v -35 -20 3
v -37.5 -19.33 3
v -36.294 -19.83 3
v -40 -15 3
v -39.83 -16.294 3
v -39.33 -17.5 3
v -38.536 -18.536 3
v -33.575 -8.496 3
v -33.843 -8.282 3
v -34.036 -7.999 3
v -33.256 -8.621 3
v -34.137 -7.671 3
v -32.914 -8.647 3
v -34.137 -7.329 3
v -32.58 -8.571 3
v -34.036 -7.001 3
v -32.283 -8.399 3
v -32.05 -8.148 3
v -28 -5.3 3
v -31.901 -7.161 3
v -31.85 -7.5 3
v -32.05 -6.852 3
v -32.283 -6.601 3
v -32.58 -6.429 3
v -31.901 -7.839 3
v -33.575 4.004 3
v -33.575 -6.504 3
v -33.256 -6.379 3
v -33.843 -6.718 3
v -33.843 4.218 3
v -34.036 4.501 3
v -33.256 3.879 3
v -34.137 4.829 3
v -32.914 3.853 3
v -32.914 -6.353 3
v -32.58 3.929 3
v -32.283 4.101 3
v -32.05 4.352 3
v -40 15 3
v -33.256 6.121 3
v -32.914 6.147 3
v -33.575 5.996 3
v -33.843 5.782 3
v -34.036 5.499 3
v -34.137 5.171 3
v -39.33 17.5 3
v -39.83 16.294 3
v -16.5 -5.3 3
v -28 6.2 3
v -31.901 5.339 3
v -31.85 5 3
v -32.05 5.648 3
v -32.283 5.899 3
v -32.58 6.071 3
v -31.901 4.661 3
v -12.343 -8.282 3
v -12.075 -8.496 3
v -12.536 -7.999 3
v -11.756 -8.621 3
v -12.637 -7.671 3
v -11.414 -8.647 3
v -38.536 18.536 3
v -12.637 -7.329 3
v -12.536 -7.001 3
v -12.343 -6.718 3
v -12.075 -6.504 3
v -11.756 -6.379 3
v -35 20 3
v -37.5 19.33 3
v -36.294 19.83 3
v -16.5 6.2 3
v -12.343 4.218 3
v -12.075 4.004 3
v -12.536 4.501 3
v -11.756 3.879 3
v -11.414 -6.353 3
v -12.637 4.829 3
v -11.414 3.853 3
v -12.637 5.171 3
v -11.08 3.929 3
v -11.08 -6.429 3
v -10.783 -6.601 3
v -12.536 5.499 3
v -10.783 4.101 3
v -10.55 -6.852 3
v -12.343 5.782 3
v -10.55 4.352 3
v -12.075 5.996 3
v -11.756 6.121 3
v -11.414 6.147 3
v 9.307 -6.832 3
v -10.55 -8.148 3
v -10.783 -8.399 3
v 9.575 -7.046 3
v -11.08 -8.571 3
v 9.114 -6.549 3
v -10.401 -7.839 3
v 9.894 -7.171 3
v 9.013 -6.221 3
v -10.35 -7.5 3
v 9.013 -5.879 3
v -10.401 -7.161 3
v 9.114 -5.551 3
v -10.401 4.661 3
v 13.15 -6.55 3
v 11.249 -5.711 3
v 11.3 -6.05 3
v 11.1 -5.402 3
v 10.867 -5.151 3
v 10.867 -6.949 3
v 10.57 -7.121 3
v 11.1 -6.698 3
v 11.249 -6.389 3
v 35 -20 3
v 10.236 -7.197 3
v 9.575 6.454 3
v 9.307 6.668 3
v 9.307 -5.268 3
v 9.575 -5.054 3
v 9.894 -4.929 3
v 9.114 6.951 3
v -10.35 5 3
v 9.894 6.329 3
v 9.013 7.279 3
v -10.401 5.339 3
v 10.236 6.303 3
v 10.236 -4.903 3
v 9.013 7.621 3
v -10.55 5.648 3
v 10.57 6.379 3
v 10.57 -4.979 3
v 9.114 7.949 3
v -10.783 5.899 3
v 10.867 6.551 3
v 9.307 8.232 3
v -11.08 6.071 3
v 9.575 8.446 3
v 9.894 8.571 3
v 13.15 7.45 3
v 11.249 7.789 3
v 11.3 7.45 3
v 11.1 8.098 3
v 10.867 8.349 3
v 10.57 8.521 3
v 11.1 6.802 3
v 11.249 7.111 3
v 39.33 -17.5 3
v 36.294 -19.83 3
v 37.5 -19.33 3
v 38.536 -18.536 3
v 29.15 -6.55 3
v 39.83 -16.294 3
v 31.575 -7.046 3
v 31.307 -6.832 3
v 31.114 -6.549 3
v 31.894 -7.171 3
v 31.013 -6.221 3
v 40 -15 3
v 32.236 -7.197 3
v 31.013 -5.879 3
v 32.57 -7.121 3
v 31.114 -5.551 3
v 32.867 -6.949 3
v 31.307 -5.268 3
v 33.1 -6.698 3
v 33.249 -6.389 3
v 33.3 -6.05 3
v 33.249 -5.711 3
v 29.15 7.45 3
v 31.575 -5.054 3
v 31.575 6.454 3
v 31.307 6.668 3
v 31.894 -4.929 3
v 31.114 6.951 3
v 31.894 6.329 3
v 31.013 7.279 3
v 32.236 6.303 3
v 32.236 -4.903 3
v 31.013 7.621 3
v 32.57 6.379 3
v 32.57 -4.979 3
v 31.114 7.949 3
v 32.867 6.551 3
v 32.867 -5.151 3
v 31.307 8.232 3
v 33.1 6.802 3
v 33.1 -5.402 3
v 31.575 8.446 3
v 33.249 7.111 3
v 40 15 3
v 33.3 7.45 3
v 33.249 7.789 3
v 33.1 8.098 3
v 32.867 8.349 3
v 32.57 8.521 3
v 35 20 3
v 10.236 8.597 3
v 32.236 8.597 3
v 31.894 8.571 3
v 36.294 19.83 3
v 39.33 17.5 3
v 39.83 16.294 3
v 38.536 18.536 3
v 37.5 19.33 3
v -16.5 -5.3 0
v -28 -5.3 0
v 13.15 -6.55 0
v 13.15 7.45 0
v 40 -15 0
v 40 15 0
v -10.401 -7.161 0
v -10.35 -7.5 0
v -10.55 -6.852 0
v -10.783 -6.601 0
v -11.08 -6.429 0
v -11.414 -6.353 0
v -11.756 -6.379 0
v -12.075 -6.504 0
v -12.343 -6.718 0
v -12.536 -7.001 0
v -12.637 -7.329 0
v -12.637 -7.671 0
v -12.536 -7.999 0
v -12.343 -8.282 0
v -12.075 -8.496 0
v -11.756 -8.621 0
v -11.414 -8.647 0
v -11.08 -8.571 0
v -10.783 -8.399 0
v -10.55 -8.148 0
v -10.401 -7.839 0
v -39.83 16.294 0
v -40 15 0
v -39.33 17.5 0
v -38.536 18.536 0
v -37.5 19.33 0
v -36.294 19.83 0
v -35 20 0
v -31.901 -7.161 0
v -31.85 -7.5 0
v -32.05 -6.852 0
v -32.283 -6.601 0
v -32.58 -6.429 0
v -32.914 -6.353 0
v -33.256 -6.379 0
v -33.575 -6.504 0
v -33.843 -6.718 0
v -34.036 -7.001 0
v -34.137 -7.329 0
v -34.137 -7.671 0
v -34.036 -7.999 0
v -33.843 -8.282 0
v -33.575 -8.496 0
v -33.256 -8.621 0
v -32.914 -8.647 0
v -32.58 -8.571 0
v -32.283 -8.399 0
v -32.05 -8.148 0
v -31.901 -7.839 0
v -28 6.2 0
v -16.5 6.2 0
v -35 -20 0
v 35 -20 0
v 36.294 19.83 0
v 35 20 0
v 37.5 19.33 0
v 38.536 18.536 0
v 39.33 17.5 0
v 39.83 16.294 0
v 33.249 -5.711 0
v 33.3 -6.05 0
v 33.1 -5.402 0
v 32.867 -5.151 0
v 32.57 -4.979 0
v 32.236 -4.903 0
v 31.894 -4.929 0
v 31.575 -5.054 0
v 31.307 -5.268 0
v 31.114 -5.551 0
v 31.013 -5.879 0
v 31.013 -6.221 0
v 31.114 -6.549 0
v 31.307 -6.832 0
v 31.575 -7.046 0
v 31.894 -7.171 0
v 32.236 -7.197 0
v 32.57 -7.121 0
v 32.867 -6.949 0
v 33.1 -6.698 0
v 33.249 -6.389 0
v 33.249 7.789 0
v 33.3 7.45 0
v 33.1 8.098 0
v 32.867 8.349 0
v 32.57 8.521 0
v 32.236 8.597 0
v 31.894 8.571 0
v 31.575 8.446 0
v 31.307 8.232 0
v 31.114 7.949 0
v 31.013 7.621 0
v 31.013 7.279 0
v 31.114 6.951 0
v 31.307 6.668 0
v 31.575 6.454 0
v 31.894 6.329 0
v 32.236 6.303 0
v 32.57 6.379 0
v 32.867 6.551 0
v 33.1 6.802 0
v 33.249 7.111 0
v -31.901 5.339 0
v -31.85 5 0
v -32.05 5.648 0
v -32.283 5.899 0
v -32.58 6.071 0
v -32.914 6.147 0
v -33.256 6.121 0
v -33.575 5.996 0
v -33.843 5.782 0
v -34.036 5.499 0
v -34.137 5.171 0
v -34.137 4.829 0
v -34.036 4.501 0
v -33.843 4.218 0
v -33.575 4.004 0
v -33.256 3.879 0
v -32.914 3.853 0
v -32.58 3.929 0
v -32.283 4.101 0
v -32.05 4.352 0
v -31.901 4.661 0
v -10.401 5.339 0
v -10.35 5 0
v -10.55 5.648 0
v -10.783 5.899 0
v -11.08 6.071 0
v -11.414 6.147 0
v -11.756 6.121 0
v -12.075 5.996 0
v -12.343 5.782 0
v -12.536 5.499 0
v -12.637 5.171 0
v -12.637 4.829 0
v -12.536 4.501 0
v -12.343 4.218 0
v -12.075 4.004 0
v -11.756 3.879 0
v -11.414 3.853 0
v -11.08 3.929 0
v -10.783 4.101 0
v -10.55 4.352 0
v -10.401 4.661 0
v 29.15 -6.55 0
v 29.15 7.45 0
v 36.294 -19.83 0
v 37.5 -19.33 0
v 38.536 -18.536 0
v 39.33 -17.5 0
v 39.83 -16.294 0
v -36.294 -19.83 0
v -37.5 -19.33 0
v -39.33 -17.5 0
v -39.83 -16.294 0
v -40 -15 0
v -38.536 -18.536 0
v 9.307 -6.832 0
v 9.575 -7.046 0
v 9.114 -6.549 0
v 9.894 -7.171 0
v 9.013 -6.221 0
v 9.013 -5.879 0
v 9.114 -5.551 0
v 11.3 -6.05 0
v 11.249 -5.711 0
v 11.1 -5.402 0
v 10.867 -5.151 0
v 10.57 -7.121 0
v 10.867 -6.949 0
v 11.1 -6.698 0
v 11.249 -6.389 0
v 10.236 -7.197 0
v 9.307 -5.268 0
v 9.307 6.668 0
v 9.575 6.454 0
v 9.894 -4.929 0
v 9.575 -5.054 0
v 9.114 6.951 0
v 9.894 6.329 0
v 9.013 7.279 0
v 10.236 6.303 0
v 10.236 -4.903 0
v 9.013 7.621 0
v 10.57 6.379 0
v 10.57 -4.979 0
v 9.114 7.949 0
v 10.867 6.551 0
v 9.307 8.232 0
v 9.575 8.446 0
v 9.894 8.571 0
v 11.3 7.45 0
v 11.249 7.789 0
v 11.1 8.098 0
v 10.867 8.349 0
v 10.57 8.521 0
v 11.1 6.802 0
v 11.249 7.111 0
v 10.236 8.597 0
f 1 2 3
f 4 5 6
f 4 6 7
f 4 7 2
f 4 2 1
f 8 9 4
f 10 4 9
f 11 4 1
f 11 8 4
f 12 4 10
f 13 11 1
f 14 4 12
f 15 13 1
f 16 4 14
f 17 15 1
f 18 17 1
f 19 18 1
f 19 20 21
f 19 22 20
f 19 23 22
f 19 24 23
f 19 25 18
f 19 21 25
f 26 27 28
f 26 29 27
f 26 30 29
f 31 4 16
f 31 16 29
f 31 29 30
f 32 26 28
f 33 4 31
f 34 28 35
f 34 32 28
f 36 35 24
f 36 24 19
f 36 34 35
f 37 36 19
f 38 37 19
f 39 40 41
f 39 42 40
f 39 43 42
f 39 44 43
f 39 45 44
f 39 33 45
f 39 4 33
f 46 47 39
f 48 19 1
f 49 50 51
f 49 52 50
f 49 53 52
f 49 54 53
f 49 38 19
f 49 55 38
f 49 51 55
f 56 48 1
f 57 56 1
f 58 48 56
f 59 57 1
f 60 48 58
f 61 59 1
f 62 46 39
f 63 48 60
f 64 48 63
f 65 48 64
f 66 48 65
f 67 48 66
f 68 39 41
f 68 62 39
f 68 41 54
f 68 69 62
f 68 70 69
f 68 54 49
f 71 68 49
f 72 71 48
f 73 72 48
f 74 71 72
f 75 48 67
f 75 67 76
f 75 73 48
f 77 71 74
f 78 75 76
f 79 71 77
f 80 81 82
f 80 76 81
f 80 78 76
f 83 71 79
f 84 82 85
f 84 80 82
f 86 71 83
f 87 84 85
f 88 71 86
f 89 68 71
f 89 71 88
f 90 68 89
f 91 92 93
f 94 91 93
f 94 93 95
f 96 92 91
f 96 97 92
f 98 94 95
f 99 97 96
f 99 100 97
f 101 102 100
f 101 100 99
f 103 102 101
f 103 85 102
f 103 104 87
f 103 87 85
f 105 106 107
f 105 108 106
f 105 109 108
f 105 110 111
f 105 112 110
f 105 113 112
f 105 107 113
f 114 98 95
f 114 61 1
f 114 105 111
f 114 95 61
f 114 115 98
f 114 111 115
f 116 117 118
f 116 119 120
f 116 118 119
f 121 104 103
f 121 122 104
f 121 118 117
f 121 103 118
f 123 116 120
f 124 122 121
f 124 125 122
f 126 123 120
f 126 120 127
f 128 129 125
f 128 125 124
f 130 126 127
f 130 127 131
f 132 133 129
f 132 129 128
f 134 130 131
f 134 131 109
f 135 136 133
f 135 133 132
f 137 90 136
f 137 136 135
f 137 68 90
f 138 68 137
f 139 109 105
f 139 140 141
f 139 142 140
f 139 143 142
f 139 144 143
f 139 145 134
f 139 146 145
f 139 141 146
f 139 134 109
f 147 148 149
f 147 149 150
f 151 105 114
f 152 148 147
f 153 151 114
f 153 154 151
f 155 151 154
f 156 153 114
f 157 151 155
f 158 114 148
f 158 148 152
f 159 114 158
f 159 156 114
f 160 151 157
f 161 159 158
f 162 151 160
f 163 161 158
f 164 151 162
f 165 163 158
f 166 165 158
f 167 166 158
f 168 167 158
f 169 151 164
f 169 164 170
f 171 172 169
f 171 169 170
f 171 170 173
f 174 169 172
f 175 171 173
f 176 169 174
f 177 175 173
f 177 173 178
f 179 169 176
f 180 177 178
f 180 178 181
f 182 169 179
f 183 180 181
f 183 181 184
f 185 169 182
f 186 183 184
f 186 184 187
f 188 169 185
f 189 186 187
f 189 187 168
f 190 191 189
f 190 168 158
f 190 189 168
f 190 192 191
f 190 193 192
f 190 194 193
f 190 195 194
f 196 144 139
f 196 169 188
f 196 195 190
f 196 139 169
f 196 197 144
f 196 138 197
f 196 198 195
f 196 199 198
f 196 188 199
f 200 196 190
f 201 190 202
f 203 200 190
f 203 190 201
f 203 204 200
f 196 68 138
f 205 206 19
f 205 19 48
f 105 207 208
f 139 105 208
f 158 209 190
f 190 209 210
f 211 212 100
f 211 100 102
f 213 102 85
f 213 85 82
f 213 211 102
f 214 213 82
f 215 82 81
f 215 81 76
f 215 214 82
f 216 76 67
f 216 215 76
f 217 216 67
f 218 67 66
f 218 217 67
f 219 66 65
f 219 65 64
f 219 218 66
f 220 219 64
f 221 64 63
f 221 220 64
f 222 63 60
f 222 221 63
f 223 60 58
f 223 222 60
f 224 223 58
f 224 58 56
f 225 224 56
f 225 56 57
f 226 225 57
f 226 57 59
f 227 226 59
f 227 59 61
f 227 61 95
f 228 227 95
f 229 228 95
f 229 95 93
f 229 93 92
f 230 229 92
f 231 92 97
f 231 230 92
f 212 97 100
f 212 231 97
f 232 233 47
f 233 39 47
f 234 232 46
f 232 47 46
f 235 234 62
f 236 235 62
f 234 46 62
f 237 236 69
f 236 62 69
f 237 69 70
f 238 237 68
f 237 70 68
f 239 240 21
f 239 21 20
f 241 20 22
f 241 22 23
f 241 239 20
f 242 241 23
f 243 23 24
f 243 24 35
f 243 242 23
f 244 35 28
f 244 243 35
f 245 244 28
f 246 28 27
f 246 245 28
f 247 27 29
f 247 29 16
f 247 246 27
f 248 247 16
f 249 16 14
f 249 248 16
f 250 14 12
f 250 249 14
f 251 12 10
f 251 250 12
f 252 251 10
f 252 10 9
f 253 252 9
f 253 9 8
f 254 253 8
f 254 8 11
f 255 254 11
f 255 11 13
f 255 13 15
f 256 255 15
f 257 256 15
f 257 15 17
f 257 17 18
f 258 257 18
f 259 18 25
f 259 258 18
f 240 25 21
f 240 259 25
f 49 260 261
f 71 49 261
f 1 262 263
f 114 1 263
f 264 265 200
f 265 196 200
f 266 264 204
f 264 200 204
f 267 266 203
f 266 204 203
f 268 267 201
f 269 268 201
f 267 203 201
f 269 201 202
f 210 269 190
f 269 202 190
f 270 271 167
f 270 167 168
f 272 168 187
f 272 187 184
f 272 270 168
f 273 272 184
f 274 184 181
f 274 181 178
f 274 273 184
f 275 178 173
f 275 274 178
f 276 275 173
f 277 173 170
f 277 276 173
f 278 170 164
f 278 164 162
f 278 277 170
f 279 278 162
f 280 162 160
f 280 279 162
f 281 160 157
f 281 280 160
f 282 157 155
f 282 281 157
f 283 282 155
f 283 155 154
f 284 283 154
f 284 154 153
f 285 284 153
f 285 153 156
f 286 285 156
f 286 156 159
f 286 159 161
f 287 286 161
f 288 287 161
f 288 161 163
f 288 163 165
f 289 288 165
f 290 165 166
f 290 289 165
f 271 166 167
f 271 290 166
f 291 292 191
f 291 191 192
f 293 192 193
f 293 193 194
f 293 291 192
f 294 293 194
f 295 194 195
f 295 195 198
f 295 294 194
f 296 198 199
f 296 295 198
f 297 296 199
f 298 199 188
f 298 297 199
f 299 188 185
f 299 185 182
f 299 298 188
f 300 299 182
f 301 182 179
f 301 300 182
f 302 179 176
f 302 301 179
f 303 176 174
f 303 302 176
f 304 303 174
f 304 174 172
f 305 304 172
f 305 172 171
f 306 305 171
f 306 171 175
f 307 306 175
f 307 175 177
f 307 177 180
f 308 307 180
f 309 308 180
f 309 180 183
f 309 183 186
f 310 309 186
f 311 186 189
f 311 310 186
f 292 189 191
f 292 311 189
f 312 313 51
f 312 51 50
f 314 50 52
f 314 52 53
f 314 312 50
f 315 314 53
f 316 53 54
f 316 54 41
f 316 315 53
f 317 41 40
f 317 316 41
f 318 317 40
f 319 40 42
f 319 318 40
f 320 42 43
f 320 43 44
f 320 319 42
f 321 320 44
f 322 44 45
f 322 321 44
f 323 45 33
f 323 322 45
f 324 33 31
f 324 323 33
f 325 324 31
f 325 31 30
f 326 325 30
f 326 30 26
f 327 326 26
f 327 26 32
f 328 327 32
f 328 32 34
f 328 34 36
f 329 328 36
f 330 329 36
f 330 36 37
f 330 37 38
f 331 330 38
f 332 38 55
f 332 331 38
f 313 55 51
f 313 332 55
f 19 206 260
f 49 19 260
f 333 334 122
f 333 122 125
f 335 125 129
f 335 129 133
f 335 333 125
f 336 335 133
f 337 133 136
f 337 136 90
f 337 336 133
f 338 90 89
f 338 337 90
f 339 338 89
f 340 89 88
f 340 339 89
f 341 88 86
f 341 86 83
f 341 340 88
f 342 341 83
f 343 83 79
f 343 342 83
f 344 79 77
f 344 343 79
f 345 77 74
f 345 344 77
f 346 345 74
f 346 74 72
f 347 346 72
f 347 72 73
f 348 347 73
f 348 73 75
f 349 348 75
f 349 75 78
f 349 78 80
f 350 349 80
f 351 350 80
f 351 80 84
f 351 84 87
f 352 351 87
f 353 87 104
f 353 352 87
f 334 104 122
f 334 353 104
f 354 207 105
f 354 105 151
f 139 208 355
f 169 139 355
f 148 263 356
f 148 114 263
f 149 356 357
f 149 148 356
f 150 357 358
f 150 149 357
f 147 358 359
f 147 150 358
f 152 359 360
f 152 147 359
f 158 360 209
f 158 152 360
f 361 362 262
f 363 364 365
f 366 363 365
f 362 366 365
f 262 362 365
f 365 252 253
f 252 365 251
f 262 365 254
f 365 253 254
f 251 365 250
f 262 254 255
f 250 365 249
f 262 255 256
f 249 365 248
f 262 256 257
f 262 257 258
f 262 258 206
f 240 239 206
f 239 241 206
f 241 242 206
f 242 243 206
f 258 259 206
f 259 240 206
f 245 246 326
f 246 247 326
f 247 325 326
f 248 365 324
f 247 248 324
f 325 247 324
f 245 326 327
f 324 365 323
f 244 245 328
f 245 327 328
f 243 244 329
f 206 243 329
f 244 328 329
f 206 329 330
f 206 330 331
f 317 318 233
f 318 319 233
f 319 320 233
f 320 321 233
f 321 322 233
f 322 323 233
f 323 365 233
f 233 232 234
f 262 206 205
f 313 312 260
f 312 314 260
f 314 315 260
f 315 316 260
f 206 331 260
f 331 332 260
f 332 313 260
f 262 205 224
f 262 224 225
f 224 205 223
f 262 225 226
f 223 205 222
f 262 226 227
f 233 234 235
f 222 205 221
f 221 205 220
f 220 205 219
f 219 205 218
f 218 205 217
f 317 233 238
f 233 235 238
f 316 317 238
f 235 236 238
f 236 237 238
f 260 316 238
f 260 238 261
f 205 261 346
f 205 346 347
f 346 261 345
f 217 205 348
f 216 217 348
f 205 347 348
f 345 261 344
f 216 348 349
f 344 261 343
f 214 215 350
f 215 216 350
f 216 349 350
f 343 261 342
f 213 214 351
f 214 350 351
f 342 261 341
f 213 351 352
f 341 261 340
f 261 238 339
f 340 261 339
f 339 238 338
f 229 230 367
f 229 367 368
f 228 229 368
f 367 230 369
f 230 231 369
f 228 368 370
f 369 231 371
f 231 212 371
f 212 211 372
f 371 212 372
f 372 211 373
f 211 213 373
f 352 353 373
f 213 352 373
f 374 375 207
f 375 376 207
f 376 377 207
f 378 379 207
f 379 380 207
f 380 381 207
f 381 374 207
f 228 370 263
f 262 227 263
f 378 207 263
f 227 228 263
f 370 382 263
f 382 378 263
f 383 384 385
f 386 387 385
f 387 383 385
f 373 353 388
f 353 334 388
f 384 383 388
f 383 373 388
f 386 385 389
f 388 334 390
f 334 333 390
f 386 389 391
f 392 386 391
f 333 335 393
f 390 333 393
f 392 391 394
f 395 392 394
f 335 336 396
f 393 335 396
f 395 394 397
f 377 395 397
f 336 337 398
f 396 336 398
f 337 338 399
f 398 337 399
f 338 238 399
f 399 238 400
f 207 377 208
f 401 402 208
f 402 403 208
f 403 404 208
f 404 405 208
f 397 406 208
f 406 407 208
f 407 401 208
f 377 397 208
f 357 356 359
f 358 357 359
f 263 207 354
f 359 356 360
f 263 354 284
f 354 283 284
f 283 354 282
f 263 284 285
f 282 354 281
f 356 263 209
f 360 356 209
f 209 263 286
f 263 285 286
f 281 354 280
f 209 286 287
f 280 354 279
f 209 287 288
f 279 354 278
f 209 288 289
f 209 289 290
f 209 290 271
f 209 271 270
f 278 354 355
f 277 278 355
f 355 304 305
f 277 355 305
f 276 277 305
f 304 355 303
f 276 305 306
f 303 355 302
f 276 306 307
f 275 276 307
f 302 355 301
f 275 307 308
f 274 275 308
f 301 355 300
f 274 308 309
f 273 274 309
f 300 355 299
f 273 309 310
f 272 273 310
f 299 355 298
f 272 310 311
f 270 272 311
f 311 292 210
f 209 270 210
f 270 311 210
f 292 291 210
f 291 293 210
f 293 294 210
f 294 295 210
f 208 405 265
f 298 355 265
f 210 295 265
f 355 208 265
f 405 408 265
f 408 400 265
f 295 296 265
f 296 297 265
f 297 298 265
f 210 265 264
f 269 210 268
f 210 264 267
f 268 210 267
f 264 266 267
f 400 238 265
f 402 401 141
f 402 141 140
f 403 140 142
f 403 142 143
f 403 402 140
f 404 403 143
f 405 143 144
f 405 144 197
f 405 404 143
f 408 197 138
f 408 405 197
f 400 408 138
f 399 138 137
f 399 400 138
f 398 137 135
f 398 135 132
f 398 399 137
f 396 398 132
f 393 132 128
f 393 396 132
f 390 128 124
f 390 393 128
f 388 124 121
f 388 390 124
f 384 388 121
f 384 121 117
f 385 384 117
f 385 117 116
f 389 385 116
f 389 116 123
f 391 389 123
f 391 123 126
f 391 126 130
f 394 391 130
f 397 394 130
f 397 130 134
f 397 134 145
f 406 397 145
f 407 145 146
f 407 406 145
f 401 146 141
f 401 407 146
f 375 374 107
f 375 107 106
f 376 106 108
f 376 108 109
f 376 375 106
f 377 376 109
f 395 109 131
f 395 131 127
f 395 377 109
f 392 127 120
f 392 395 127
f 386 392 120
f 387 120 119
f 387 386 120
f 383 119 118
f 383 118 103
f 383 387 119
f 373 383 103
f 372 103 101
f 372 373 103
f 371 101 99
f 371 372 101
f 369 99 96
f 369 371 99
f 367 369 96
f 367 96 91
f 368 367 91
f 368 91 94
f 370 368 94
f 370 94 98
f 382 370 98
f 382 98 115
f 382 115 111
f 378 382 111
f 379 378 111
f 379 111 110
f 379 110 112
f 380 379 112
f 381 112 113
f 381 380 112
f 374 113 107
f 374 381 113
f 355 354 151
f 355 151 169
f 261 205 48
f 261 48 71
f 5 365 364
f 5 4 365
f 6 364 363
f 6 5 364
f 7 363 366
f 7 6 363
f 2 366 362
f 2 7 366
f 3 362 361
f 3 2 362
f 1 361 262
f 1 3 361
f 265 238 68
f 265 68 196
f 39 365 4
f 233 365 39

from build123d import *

# Parameters (mm, degrees)
SKETCH1_W           = 80
SKETCH1_H           = 40
SKETCH1_R           = 1.15
SKETCH1_W_2         = 11.5
SKETCH1_H_2         = 11.5
SKETCH1_W_3         = 16
SKETCH1_H_3         = 14
BOSS_EXTRUDE1_DEPTH = 3
FILLET1_R           = 5


with BuildPart() as part:
    # Sketch1 → Boss-Extrude1 (new body)
    with BuildSketch(Plane.XY):
        Rectangle(SKETCH1_W, SKETCH1_H)
        with Locations((-11.5, 5)):
            Circle(SKETCH1_R, mode=Mode.SUBTRACT)
        with Locations((-11.5, -7.5)):
            Circle(SKETCH1_R, mode=Mode.SUBTRACT)
        with Locations((-33, 5)):
            Circle(SKETCH1_R, mode=Mode.SUBTRACT)
        with Locations((-33, -7.5)):
            Circle(SKETCH1_R, mode=Mode.SUBTRACT)
        with Locations((10.15, 7.45)):
            Circle(SKETCH1_R, mode=Mode.SUBTRACT)
        with Locations((10.15, -6.05)):
            Circle(SKETCH1_R, mode=Mode.SUBTRACT)
        with Locations((32.15, 7.45)):
            Circle(SKETCH1_R, mode=Mode.SUBTRACT)
        with Locations((32.15, -6.05)):
            Circle(SKETCH1_R, mode=Mode.SUBTRACT)
        with Locations((-22.25, 0.45)):
            Rectangle(SKETCH1_W_2, SKETCH1_H_2, mode=Mode.SUBTRACT)
        with Locations((21.15, 0.45)):
            Rectangle(SKETCH1_W_3, SKETCH1_H_3, mode=Mode.SUBTRACT)
    extrude(amount=BOSS_EXTRUDE1_DEPTH)

    # Fillet1
    fillet1_edges = [part.edges().sort_by_distance(p)[0] for p in [
        (40, -20, 1.5),
        (-40, -20, 1.5),
        (-40, 20, 1.5),
        (40, 20, 1.5),
    ]]
    fillet(fillet1_edges, radius=FILLET1_R)


solid = part.part
